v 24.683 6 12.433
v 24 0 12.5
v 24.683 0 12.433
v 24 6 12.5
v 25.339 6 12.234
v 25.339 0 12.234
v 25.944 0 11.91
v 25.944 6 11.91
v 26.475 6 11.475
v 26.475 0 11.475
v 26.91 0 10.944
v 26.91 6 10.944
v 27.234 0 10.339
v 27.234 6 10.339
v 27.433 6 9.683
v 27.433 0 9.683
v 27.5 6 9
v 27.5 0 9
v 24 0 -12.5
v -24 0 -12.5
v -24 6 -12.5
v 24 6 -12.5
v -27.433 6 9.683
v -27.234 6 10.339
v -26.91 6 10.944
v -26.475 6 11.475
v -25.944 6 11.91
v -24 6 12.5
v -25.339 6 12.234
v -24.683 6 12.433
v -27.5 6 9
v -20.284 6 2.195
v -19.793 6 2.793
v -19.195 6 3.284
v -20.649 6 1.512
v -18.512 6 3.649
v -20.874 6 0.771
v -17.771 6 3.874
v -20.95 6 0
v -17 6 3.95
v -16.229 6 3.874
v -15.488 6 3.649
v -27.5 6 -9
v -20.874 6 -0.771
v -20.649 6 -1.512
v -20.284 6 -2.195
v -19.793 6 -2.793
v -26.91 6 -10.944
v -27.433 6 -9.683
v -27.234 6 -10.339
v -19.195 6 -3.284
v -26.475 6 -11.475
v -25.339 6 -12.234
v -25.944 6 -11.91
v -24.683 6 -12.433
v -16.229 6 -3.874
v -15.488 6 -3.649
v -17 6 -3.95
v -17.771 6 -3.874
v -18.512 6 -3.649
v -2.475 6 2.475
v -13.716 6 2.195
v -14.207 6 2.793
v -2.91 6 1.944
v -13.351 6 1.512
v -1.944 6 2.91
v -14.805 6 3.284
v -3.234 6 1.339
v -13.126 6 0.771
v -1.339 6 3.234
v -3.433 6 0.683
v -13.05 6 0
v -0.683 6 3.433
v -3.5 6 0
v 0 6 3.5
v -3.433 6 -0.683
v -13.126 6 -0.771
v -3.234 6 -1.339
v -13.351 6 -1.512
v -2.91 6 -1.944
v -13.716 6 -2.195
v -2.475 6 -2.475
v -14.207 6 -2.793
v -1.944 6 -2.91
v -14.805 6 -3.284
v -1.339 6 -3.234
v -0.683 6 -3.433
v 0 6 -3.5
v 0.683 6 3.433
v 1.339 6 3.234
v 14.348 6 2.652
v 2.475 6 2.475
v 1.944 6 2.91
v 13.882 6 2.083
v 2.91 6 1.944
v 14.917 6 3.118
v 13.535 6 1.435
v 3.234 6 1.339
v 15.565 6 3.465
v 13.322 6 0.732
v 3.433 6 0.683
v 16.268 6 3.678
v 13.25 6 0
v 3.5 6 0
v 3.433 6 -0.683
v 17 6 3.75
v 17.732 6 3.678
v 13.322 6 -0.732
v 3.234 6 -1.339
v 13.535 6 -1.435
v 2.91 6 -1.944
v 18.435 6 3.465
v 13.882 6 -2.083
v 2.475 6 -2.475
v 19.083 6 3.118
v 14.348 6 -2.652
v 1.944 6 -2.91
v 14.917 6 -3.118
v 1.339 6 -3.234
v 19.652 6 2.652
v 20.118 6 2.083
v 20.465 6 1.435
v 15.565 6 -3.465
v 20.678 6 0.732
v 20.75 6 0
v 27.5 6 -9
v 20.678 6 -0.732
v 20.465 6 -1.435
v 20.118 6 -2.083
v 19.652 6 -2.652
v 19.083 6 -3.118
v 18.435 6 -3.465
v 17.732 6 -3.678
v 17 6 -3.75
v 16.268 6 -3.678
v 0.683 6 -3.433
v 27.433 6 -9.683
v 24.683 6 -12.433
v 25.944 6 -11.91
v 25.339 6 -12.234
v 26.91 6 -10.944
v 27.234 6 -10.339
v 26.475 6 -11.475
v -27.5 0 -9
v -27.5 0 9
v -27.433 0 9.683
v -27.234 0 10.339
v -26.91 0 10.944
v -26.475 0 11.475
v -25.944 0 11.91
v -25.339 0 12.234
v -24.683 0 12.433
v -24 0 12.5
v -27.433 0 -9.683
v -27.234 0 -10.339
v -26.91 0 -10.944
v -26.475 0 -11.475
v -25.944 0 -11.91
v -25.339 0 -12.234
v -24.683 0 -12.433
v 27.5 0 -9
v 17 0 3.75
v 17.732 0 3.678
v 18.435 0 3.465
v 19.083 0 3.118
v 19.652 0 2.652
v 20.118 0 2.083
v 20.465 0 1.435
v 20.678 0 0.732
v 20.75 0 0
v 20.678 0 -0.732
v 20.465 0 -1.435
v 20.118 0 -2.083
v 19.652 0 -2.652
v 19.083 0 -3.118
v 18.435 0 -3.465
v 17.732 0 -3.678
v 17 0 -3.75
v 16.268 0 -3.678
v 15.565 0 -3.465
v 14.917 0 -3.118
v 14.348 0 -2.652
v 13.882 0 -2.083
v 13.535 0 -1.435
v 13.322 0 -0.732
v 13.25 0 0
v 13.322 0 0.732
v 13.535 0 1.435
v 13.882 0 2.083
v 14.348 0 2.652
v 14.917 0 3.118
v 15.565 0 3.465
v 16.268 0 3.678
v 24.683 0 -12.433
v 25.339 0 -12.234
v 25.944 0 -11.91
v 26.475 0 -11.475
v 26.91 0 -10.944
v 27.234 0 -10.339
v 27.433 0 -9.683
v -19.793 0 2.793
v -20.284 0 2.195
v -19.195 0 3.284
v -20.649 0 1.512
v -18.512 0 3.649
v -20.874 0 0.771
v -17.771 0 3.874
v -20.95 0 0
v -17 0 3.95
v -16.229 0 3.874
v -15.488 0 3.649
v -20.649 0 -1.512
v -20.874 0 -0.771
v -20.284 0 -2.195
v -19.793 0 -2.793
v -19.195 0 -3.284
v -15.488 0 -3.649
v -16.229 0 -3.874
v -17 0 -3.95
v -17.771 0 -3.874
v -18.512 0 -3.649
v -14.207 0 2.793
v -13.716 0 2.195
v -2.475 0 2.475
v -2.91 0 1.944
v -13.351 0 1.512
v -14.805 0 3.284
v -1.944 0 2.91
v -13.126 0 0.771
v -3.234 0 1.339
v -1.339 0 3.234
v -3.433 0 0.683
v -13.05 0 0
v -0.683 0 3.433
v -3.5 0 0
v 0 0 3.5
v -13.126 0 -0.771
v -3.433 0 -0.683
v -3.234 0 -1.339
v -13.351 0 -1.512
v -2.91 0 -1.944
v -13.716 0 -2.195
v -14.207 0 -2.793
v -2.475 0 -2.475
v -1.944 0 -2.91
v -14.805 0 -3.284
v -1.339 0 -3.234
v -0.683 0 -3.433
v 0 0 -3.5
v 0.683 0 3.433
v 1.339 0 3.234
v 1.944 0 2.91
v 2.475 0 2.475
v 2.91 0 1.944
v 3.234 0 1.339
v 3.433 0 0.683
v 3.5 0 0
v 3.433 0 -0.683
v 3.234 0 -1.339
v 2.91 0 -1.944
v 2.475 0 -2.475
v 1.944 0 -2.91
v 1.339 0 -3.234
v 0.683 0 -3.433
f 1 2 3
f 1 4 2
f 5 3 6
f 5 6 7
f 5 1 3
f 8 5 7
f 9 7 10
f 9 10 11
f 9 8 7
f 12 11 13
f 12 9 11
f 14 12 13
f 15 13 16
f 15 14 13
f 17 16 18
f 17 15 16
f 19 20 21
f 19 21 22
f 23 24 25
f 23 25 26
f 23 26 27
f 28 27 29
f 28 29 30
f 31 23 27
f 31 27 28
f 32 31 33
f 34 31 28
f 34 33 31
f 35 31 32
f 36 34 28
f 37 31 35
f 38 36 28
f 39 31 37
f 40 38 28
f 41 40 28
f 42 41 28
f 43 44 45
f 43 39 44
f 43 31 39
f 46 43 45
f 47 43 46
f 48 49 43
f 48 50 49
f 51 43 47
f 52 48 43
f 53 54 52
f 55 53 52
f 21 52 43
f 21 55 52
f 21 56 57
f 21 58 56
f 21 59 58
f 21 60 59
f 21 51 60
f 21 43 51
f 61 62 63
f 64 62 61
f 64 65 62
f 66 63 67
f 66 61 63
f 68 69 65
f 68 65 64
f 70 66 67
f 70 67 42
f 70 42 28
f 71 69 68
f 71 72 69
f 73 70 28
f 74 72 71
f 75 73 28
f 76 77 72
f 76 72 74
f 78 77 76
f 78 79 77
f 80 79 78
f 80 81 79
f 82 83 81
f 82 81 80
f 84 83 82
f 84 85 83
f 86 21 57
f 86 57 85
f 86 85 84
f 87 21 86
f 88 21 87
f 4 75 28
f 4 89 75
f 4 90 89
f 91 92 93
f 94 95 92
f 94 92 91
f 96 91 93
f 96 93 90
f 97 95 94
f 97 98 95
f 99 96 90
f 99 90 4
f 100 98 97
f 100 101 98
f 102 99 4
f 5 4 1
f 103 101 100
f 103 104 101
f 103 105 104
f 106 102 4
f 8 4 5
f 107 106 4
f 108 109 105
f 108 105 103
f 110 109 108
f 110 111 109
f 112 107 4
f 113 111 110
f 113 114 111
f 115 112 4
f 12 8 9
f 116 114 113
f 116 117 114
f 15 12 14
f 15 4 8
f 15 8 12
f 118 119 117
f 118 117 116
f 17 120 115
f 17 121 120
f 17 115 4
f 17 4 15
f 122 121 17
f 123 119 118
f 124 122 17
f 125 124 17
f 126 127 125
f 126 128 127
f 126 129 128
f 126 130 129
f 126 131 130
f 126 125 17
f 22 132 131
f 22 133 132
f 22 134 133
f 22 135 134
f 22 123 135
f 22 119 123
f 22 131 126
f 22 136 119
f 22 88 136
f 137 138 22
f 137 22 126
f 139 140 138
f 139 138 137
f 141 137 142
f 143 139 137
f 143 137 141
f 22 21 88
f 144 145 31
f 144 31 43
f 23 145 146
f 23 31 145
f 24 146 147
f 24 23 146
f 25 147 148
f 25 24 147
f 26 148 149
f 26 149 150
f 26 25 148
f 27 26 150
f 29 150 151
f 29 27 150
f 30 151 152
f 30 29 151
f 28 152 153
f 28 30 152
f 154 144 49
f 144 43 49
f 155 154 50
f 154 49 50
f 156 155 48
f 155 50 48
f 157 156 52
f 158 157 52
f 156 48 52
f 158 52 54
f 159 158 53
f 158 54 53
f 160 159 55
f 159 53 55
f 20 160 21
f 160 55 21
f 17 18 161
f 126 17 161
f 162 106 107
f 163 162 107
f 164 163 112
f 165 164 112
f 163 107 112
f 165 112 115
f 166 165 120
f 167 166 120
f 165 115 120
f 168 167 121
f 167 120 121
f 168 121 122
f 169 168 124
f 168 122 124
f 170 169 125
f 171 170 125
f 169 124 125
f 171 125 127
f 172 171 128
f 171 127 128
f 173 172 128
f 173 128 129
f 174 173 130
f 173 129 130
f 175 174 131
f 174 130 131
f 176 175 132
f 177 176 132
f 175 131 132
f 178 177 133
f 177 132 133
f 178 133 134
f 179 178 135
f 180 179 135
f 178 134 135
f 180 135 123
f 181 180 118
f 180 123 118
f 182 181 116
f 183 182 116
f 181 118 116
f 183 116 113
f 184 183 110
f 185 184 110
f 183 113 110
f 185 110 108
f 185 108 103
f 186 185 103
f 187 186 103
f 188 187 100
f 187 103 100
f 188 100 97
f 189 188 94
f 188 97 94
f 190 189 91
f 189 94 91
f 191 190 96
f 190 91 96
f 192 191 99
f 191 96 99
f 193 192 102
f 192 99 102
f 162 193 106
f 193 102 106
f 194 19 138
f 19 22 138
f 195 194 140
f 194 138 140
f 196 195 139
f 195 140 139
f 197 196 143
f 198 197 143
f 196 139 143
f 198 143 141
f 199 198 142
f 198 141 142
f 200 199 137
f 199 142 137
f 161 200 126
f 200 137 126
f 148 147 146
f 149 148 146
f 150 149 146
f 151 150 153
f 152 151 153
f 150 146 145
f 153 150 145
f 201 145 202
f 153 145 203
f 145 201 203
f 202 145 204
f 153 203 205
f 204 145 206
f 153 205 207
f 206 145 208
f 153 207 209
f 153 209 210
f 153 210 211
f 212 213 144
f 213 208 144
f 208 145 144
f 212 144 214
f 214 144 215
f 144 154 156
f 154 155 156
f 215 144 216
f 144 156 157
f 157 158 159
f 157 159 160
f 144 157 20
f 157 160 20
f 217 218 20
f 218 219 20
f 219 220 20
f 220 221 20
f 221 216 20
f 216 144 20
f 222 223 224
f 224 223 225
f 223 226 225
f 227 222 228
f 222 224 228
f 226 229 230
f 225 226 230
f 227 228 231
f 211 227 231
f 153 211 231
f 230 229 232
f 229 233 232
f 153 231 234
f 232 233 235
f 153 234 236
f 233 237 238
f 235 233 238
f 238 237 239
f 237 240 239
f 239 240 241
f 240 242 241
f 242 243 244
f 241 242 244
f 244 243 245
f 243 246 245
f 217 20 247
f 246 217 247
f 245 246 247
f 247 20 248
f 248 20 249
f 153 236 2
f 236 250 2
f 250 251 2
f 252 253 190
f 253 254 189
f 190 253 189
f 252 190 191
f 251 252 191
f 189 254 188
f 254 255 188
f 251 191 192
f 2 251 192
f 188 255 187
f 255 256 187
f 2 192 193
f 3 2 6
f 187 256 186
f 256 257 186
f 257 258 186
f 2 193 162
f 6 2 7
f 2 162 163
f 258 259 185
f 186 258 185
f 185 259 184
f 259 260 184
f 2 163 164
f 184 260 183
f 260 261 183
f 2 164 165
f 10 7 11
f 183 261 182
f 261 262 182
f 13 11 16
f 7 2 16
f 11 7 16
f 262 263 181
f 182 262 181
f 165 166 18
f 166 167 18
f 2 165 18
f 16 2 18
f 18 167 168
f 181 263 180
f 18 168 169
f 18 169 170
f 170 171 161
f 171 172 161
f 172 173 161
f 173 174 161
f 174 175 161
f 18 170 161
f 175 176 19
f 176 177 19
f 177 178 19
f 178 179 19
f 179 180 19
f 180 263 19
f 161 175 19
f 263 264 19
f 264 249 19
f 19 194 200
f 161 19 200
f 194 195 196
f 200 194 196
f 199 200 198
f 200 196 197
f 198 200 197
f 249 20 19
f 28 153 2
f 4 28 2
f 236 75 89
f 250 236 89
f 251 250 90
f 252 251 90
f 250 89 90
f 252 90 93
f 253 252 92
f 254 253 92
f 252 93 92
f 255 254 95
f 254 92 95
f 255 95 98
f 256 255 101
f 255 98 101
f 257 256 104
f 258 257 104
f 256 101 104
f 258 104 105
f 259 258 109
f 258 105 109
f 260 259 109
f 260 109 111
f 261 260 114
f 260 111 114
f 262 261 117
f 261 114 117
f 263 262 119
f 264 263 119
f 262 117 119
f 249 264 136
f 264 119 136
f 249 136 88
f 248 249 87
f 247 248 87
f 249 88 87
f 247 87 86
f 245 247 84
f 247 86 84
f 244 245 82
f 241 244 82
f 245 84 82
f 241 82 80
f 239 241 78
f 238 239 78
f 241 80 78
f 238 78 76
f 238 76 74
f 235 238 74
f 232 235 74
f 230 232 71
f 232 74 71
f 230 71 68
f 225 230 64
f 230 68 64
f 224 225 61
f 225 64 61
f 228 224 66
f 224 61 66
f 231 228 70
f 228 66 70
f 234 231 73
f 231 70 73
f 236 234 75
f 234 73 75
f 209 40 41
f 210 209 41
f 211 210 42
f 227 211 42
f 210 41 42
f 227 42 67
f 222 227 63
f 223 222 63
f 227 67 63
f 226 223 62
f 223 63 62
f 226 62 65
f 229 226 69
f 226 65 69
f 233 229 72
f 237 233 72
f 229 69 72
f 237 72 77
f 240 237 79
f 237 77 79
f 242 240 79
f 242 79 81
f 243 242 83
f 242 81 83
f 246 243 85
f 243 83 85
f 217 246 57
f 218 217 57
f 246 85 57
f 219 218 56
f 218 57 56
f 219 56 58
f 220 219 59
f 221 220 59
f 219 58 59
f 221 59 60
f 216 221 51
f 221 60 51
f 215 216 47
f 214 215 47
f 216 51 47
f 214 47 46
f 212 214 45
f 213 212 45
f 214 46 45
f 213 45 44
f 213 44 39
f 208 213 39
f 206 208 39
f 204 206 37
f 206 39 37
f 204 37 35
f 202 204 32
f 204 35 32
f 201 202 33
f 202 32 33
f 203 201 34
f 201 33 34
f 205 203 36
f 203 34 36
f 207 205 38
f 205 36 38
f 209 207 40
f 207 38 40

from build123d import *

# Parameters (mm, degrees)
SKETCH1_W           = 55
SKETCH1_H           = 25
BOSS_EXTRUDE1_DEPTH = 6
SKETCH2_R           = 3.5
SKETCH2_R_2         = 3.75
SKETCH2_R_3         = 3.95
CUT_EXTRUDE1_DEPTH  = 6
FILLET1_R           = 3.5


with BuildPart() as part:
    # Sketch1 → Boss-Extrude1 (new body)
    with BuildSketch(Plane(origin=(0, 0, 0), x_dir=(1, 0, 0), z_dir=(0, 1, 0))):
        Rectangle(SKETCH1_W, SKETCH1_H)
    extrude(amount=BOSS_EXTRUDE1_DEPTH)

    # Sketch2 → Cut-Extrude1 (cut)
    with BuildSketch(Plane(origin=(0, 6, 0), x_dir=(1, 0, 0), z_dir=(0, 1, 0))):
        with Locations(Location((0, 0, 0), (0, 0, 270))):
            Circle(SKETCH2_R)
        with Locations(Location((17, 0, 0), (0, 0, 270))):
            Circle(SKETCH2_R_2)
        with Locations(Location((-17, 0, 0), (0, 0, 270))):
            Circle(SKETCH2_R_3)
    extrude(amount=-CUT_EXTRUDE1_DEPTH, mode=Mode.SUBTRACT)

    # Fillet1
    fillet1_edges = [part.edges().sort_by_distance(p)[0] for p in [
        (27.5, 3, 12.5),
        (-27.5, 3, 12.5),
        (-27.5, 3, -12.5),
        (27.5, 3, -12.5),
    ]]
    fillet(fillet1_edges, radius=FILLET1_R)


solid = part.part
